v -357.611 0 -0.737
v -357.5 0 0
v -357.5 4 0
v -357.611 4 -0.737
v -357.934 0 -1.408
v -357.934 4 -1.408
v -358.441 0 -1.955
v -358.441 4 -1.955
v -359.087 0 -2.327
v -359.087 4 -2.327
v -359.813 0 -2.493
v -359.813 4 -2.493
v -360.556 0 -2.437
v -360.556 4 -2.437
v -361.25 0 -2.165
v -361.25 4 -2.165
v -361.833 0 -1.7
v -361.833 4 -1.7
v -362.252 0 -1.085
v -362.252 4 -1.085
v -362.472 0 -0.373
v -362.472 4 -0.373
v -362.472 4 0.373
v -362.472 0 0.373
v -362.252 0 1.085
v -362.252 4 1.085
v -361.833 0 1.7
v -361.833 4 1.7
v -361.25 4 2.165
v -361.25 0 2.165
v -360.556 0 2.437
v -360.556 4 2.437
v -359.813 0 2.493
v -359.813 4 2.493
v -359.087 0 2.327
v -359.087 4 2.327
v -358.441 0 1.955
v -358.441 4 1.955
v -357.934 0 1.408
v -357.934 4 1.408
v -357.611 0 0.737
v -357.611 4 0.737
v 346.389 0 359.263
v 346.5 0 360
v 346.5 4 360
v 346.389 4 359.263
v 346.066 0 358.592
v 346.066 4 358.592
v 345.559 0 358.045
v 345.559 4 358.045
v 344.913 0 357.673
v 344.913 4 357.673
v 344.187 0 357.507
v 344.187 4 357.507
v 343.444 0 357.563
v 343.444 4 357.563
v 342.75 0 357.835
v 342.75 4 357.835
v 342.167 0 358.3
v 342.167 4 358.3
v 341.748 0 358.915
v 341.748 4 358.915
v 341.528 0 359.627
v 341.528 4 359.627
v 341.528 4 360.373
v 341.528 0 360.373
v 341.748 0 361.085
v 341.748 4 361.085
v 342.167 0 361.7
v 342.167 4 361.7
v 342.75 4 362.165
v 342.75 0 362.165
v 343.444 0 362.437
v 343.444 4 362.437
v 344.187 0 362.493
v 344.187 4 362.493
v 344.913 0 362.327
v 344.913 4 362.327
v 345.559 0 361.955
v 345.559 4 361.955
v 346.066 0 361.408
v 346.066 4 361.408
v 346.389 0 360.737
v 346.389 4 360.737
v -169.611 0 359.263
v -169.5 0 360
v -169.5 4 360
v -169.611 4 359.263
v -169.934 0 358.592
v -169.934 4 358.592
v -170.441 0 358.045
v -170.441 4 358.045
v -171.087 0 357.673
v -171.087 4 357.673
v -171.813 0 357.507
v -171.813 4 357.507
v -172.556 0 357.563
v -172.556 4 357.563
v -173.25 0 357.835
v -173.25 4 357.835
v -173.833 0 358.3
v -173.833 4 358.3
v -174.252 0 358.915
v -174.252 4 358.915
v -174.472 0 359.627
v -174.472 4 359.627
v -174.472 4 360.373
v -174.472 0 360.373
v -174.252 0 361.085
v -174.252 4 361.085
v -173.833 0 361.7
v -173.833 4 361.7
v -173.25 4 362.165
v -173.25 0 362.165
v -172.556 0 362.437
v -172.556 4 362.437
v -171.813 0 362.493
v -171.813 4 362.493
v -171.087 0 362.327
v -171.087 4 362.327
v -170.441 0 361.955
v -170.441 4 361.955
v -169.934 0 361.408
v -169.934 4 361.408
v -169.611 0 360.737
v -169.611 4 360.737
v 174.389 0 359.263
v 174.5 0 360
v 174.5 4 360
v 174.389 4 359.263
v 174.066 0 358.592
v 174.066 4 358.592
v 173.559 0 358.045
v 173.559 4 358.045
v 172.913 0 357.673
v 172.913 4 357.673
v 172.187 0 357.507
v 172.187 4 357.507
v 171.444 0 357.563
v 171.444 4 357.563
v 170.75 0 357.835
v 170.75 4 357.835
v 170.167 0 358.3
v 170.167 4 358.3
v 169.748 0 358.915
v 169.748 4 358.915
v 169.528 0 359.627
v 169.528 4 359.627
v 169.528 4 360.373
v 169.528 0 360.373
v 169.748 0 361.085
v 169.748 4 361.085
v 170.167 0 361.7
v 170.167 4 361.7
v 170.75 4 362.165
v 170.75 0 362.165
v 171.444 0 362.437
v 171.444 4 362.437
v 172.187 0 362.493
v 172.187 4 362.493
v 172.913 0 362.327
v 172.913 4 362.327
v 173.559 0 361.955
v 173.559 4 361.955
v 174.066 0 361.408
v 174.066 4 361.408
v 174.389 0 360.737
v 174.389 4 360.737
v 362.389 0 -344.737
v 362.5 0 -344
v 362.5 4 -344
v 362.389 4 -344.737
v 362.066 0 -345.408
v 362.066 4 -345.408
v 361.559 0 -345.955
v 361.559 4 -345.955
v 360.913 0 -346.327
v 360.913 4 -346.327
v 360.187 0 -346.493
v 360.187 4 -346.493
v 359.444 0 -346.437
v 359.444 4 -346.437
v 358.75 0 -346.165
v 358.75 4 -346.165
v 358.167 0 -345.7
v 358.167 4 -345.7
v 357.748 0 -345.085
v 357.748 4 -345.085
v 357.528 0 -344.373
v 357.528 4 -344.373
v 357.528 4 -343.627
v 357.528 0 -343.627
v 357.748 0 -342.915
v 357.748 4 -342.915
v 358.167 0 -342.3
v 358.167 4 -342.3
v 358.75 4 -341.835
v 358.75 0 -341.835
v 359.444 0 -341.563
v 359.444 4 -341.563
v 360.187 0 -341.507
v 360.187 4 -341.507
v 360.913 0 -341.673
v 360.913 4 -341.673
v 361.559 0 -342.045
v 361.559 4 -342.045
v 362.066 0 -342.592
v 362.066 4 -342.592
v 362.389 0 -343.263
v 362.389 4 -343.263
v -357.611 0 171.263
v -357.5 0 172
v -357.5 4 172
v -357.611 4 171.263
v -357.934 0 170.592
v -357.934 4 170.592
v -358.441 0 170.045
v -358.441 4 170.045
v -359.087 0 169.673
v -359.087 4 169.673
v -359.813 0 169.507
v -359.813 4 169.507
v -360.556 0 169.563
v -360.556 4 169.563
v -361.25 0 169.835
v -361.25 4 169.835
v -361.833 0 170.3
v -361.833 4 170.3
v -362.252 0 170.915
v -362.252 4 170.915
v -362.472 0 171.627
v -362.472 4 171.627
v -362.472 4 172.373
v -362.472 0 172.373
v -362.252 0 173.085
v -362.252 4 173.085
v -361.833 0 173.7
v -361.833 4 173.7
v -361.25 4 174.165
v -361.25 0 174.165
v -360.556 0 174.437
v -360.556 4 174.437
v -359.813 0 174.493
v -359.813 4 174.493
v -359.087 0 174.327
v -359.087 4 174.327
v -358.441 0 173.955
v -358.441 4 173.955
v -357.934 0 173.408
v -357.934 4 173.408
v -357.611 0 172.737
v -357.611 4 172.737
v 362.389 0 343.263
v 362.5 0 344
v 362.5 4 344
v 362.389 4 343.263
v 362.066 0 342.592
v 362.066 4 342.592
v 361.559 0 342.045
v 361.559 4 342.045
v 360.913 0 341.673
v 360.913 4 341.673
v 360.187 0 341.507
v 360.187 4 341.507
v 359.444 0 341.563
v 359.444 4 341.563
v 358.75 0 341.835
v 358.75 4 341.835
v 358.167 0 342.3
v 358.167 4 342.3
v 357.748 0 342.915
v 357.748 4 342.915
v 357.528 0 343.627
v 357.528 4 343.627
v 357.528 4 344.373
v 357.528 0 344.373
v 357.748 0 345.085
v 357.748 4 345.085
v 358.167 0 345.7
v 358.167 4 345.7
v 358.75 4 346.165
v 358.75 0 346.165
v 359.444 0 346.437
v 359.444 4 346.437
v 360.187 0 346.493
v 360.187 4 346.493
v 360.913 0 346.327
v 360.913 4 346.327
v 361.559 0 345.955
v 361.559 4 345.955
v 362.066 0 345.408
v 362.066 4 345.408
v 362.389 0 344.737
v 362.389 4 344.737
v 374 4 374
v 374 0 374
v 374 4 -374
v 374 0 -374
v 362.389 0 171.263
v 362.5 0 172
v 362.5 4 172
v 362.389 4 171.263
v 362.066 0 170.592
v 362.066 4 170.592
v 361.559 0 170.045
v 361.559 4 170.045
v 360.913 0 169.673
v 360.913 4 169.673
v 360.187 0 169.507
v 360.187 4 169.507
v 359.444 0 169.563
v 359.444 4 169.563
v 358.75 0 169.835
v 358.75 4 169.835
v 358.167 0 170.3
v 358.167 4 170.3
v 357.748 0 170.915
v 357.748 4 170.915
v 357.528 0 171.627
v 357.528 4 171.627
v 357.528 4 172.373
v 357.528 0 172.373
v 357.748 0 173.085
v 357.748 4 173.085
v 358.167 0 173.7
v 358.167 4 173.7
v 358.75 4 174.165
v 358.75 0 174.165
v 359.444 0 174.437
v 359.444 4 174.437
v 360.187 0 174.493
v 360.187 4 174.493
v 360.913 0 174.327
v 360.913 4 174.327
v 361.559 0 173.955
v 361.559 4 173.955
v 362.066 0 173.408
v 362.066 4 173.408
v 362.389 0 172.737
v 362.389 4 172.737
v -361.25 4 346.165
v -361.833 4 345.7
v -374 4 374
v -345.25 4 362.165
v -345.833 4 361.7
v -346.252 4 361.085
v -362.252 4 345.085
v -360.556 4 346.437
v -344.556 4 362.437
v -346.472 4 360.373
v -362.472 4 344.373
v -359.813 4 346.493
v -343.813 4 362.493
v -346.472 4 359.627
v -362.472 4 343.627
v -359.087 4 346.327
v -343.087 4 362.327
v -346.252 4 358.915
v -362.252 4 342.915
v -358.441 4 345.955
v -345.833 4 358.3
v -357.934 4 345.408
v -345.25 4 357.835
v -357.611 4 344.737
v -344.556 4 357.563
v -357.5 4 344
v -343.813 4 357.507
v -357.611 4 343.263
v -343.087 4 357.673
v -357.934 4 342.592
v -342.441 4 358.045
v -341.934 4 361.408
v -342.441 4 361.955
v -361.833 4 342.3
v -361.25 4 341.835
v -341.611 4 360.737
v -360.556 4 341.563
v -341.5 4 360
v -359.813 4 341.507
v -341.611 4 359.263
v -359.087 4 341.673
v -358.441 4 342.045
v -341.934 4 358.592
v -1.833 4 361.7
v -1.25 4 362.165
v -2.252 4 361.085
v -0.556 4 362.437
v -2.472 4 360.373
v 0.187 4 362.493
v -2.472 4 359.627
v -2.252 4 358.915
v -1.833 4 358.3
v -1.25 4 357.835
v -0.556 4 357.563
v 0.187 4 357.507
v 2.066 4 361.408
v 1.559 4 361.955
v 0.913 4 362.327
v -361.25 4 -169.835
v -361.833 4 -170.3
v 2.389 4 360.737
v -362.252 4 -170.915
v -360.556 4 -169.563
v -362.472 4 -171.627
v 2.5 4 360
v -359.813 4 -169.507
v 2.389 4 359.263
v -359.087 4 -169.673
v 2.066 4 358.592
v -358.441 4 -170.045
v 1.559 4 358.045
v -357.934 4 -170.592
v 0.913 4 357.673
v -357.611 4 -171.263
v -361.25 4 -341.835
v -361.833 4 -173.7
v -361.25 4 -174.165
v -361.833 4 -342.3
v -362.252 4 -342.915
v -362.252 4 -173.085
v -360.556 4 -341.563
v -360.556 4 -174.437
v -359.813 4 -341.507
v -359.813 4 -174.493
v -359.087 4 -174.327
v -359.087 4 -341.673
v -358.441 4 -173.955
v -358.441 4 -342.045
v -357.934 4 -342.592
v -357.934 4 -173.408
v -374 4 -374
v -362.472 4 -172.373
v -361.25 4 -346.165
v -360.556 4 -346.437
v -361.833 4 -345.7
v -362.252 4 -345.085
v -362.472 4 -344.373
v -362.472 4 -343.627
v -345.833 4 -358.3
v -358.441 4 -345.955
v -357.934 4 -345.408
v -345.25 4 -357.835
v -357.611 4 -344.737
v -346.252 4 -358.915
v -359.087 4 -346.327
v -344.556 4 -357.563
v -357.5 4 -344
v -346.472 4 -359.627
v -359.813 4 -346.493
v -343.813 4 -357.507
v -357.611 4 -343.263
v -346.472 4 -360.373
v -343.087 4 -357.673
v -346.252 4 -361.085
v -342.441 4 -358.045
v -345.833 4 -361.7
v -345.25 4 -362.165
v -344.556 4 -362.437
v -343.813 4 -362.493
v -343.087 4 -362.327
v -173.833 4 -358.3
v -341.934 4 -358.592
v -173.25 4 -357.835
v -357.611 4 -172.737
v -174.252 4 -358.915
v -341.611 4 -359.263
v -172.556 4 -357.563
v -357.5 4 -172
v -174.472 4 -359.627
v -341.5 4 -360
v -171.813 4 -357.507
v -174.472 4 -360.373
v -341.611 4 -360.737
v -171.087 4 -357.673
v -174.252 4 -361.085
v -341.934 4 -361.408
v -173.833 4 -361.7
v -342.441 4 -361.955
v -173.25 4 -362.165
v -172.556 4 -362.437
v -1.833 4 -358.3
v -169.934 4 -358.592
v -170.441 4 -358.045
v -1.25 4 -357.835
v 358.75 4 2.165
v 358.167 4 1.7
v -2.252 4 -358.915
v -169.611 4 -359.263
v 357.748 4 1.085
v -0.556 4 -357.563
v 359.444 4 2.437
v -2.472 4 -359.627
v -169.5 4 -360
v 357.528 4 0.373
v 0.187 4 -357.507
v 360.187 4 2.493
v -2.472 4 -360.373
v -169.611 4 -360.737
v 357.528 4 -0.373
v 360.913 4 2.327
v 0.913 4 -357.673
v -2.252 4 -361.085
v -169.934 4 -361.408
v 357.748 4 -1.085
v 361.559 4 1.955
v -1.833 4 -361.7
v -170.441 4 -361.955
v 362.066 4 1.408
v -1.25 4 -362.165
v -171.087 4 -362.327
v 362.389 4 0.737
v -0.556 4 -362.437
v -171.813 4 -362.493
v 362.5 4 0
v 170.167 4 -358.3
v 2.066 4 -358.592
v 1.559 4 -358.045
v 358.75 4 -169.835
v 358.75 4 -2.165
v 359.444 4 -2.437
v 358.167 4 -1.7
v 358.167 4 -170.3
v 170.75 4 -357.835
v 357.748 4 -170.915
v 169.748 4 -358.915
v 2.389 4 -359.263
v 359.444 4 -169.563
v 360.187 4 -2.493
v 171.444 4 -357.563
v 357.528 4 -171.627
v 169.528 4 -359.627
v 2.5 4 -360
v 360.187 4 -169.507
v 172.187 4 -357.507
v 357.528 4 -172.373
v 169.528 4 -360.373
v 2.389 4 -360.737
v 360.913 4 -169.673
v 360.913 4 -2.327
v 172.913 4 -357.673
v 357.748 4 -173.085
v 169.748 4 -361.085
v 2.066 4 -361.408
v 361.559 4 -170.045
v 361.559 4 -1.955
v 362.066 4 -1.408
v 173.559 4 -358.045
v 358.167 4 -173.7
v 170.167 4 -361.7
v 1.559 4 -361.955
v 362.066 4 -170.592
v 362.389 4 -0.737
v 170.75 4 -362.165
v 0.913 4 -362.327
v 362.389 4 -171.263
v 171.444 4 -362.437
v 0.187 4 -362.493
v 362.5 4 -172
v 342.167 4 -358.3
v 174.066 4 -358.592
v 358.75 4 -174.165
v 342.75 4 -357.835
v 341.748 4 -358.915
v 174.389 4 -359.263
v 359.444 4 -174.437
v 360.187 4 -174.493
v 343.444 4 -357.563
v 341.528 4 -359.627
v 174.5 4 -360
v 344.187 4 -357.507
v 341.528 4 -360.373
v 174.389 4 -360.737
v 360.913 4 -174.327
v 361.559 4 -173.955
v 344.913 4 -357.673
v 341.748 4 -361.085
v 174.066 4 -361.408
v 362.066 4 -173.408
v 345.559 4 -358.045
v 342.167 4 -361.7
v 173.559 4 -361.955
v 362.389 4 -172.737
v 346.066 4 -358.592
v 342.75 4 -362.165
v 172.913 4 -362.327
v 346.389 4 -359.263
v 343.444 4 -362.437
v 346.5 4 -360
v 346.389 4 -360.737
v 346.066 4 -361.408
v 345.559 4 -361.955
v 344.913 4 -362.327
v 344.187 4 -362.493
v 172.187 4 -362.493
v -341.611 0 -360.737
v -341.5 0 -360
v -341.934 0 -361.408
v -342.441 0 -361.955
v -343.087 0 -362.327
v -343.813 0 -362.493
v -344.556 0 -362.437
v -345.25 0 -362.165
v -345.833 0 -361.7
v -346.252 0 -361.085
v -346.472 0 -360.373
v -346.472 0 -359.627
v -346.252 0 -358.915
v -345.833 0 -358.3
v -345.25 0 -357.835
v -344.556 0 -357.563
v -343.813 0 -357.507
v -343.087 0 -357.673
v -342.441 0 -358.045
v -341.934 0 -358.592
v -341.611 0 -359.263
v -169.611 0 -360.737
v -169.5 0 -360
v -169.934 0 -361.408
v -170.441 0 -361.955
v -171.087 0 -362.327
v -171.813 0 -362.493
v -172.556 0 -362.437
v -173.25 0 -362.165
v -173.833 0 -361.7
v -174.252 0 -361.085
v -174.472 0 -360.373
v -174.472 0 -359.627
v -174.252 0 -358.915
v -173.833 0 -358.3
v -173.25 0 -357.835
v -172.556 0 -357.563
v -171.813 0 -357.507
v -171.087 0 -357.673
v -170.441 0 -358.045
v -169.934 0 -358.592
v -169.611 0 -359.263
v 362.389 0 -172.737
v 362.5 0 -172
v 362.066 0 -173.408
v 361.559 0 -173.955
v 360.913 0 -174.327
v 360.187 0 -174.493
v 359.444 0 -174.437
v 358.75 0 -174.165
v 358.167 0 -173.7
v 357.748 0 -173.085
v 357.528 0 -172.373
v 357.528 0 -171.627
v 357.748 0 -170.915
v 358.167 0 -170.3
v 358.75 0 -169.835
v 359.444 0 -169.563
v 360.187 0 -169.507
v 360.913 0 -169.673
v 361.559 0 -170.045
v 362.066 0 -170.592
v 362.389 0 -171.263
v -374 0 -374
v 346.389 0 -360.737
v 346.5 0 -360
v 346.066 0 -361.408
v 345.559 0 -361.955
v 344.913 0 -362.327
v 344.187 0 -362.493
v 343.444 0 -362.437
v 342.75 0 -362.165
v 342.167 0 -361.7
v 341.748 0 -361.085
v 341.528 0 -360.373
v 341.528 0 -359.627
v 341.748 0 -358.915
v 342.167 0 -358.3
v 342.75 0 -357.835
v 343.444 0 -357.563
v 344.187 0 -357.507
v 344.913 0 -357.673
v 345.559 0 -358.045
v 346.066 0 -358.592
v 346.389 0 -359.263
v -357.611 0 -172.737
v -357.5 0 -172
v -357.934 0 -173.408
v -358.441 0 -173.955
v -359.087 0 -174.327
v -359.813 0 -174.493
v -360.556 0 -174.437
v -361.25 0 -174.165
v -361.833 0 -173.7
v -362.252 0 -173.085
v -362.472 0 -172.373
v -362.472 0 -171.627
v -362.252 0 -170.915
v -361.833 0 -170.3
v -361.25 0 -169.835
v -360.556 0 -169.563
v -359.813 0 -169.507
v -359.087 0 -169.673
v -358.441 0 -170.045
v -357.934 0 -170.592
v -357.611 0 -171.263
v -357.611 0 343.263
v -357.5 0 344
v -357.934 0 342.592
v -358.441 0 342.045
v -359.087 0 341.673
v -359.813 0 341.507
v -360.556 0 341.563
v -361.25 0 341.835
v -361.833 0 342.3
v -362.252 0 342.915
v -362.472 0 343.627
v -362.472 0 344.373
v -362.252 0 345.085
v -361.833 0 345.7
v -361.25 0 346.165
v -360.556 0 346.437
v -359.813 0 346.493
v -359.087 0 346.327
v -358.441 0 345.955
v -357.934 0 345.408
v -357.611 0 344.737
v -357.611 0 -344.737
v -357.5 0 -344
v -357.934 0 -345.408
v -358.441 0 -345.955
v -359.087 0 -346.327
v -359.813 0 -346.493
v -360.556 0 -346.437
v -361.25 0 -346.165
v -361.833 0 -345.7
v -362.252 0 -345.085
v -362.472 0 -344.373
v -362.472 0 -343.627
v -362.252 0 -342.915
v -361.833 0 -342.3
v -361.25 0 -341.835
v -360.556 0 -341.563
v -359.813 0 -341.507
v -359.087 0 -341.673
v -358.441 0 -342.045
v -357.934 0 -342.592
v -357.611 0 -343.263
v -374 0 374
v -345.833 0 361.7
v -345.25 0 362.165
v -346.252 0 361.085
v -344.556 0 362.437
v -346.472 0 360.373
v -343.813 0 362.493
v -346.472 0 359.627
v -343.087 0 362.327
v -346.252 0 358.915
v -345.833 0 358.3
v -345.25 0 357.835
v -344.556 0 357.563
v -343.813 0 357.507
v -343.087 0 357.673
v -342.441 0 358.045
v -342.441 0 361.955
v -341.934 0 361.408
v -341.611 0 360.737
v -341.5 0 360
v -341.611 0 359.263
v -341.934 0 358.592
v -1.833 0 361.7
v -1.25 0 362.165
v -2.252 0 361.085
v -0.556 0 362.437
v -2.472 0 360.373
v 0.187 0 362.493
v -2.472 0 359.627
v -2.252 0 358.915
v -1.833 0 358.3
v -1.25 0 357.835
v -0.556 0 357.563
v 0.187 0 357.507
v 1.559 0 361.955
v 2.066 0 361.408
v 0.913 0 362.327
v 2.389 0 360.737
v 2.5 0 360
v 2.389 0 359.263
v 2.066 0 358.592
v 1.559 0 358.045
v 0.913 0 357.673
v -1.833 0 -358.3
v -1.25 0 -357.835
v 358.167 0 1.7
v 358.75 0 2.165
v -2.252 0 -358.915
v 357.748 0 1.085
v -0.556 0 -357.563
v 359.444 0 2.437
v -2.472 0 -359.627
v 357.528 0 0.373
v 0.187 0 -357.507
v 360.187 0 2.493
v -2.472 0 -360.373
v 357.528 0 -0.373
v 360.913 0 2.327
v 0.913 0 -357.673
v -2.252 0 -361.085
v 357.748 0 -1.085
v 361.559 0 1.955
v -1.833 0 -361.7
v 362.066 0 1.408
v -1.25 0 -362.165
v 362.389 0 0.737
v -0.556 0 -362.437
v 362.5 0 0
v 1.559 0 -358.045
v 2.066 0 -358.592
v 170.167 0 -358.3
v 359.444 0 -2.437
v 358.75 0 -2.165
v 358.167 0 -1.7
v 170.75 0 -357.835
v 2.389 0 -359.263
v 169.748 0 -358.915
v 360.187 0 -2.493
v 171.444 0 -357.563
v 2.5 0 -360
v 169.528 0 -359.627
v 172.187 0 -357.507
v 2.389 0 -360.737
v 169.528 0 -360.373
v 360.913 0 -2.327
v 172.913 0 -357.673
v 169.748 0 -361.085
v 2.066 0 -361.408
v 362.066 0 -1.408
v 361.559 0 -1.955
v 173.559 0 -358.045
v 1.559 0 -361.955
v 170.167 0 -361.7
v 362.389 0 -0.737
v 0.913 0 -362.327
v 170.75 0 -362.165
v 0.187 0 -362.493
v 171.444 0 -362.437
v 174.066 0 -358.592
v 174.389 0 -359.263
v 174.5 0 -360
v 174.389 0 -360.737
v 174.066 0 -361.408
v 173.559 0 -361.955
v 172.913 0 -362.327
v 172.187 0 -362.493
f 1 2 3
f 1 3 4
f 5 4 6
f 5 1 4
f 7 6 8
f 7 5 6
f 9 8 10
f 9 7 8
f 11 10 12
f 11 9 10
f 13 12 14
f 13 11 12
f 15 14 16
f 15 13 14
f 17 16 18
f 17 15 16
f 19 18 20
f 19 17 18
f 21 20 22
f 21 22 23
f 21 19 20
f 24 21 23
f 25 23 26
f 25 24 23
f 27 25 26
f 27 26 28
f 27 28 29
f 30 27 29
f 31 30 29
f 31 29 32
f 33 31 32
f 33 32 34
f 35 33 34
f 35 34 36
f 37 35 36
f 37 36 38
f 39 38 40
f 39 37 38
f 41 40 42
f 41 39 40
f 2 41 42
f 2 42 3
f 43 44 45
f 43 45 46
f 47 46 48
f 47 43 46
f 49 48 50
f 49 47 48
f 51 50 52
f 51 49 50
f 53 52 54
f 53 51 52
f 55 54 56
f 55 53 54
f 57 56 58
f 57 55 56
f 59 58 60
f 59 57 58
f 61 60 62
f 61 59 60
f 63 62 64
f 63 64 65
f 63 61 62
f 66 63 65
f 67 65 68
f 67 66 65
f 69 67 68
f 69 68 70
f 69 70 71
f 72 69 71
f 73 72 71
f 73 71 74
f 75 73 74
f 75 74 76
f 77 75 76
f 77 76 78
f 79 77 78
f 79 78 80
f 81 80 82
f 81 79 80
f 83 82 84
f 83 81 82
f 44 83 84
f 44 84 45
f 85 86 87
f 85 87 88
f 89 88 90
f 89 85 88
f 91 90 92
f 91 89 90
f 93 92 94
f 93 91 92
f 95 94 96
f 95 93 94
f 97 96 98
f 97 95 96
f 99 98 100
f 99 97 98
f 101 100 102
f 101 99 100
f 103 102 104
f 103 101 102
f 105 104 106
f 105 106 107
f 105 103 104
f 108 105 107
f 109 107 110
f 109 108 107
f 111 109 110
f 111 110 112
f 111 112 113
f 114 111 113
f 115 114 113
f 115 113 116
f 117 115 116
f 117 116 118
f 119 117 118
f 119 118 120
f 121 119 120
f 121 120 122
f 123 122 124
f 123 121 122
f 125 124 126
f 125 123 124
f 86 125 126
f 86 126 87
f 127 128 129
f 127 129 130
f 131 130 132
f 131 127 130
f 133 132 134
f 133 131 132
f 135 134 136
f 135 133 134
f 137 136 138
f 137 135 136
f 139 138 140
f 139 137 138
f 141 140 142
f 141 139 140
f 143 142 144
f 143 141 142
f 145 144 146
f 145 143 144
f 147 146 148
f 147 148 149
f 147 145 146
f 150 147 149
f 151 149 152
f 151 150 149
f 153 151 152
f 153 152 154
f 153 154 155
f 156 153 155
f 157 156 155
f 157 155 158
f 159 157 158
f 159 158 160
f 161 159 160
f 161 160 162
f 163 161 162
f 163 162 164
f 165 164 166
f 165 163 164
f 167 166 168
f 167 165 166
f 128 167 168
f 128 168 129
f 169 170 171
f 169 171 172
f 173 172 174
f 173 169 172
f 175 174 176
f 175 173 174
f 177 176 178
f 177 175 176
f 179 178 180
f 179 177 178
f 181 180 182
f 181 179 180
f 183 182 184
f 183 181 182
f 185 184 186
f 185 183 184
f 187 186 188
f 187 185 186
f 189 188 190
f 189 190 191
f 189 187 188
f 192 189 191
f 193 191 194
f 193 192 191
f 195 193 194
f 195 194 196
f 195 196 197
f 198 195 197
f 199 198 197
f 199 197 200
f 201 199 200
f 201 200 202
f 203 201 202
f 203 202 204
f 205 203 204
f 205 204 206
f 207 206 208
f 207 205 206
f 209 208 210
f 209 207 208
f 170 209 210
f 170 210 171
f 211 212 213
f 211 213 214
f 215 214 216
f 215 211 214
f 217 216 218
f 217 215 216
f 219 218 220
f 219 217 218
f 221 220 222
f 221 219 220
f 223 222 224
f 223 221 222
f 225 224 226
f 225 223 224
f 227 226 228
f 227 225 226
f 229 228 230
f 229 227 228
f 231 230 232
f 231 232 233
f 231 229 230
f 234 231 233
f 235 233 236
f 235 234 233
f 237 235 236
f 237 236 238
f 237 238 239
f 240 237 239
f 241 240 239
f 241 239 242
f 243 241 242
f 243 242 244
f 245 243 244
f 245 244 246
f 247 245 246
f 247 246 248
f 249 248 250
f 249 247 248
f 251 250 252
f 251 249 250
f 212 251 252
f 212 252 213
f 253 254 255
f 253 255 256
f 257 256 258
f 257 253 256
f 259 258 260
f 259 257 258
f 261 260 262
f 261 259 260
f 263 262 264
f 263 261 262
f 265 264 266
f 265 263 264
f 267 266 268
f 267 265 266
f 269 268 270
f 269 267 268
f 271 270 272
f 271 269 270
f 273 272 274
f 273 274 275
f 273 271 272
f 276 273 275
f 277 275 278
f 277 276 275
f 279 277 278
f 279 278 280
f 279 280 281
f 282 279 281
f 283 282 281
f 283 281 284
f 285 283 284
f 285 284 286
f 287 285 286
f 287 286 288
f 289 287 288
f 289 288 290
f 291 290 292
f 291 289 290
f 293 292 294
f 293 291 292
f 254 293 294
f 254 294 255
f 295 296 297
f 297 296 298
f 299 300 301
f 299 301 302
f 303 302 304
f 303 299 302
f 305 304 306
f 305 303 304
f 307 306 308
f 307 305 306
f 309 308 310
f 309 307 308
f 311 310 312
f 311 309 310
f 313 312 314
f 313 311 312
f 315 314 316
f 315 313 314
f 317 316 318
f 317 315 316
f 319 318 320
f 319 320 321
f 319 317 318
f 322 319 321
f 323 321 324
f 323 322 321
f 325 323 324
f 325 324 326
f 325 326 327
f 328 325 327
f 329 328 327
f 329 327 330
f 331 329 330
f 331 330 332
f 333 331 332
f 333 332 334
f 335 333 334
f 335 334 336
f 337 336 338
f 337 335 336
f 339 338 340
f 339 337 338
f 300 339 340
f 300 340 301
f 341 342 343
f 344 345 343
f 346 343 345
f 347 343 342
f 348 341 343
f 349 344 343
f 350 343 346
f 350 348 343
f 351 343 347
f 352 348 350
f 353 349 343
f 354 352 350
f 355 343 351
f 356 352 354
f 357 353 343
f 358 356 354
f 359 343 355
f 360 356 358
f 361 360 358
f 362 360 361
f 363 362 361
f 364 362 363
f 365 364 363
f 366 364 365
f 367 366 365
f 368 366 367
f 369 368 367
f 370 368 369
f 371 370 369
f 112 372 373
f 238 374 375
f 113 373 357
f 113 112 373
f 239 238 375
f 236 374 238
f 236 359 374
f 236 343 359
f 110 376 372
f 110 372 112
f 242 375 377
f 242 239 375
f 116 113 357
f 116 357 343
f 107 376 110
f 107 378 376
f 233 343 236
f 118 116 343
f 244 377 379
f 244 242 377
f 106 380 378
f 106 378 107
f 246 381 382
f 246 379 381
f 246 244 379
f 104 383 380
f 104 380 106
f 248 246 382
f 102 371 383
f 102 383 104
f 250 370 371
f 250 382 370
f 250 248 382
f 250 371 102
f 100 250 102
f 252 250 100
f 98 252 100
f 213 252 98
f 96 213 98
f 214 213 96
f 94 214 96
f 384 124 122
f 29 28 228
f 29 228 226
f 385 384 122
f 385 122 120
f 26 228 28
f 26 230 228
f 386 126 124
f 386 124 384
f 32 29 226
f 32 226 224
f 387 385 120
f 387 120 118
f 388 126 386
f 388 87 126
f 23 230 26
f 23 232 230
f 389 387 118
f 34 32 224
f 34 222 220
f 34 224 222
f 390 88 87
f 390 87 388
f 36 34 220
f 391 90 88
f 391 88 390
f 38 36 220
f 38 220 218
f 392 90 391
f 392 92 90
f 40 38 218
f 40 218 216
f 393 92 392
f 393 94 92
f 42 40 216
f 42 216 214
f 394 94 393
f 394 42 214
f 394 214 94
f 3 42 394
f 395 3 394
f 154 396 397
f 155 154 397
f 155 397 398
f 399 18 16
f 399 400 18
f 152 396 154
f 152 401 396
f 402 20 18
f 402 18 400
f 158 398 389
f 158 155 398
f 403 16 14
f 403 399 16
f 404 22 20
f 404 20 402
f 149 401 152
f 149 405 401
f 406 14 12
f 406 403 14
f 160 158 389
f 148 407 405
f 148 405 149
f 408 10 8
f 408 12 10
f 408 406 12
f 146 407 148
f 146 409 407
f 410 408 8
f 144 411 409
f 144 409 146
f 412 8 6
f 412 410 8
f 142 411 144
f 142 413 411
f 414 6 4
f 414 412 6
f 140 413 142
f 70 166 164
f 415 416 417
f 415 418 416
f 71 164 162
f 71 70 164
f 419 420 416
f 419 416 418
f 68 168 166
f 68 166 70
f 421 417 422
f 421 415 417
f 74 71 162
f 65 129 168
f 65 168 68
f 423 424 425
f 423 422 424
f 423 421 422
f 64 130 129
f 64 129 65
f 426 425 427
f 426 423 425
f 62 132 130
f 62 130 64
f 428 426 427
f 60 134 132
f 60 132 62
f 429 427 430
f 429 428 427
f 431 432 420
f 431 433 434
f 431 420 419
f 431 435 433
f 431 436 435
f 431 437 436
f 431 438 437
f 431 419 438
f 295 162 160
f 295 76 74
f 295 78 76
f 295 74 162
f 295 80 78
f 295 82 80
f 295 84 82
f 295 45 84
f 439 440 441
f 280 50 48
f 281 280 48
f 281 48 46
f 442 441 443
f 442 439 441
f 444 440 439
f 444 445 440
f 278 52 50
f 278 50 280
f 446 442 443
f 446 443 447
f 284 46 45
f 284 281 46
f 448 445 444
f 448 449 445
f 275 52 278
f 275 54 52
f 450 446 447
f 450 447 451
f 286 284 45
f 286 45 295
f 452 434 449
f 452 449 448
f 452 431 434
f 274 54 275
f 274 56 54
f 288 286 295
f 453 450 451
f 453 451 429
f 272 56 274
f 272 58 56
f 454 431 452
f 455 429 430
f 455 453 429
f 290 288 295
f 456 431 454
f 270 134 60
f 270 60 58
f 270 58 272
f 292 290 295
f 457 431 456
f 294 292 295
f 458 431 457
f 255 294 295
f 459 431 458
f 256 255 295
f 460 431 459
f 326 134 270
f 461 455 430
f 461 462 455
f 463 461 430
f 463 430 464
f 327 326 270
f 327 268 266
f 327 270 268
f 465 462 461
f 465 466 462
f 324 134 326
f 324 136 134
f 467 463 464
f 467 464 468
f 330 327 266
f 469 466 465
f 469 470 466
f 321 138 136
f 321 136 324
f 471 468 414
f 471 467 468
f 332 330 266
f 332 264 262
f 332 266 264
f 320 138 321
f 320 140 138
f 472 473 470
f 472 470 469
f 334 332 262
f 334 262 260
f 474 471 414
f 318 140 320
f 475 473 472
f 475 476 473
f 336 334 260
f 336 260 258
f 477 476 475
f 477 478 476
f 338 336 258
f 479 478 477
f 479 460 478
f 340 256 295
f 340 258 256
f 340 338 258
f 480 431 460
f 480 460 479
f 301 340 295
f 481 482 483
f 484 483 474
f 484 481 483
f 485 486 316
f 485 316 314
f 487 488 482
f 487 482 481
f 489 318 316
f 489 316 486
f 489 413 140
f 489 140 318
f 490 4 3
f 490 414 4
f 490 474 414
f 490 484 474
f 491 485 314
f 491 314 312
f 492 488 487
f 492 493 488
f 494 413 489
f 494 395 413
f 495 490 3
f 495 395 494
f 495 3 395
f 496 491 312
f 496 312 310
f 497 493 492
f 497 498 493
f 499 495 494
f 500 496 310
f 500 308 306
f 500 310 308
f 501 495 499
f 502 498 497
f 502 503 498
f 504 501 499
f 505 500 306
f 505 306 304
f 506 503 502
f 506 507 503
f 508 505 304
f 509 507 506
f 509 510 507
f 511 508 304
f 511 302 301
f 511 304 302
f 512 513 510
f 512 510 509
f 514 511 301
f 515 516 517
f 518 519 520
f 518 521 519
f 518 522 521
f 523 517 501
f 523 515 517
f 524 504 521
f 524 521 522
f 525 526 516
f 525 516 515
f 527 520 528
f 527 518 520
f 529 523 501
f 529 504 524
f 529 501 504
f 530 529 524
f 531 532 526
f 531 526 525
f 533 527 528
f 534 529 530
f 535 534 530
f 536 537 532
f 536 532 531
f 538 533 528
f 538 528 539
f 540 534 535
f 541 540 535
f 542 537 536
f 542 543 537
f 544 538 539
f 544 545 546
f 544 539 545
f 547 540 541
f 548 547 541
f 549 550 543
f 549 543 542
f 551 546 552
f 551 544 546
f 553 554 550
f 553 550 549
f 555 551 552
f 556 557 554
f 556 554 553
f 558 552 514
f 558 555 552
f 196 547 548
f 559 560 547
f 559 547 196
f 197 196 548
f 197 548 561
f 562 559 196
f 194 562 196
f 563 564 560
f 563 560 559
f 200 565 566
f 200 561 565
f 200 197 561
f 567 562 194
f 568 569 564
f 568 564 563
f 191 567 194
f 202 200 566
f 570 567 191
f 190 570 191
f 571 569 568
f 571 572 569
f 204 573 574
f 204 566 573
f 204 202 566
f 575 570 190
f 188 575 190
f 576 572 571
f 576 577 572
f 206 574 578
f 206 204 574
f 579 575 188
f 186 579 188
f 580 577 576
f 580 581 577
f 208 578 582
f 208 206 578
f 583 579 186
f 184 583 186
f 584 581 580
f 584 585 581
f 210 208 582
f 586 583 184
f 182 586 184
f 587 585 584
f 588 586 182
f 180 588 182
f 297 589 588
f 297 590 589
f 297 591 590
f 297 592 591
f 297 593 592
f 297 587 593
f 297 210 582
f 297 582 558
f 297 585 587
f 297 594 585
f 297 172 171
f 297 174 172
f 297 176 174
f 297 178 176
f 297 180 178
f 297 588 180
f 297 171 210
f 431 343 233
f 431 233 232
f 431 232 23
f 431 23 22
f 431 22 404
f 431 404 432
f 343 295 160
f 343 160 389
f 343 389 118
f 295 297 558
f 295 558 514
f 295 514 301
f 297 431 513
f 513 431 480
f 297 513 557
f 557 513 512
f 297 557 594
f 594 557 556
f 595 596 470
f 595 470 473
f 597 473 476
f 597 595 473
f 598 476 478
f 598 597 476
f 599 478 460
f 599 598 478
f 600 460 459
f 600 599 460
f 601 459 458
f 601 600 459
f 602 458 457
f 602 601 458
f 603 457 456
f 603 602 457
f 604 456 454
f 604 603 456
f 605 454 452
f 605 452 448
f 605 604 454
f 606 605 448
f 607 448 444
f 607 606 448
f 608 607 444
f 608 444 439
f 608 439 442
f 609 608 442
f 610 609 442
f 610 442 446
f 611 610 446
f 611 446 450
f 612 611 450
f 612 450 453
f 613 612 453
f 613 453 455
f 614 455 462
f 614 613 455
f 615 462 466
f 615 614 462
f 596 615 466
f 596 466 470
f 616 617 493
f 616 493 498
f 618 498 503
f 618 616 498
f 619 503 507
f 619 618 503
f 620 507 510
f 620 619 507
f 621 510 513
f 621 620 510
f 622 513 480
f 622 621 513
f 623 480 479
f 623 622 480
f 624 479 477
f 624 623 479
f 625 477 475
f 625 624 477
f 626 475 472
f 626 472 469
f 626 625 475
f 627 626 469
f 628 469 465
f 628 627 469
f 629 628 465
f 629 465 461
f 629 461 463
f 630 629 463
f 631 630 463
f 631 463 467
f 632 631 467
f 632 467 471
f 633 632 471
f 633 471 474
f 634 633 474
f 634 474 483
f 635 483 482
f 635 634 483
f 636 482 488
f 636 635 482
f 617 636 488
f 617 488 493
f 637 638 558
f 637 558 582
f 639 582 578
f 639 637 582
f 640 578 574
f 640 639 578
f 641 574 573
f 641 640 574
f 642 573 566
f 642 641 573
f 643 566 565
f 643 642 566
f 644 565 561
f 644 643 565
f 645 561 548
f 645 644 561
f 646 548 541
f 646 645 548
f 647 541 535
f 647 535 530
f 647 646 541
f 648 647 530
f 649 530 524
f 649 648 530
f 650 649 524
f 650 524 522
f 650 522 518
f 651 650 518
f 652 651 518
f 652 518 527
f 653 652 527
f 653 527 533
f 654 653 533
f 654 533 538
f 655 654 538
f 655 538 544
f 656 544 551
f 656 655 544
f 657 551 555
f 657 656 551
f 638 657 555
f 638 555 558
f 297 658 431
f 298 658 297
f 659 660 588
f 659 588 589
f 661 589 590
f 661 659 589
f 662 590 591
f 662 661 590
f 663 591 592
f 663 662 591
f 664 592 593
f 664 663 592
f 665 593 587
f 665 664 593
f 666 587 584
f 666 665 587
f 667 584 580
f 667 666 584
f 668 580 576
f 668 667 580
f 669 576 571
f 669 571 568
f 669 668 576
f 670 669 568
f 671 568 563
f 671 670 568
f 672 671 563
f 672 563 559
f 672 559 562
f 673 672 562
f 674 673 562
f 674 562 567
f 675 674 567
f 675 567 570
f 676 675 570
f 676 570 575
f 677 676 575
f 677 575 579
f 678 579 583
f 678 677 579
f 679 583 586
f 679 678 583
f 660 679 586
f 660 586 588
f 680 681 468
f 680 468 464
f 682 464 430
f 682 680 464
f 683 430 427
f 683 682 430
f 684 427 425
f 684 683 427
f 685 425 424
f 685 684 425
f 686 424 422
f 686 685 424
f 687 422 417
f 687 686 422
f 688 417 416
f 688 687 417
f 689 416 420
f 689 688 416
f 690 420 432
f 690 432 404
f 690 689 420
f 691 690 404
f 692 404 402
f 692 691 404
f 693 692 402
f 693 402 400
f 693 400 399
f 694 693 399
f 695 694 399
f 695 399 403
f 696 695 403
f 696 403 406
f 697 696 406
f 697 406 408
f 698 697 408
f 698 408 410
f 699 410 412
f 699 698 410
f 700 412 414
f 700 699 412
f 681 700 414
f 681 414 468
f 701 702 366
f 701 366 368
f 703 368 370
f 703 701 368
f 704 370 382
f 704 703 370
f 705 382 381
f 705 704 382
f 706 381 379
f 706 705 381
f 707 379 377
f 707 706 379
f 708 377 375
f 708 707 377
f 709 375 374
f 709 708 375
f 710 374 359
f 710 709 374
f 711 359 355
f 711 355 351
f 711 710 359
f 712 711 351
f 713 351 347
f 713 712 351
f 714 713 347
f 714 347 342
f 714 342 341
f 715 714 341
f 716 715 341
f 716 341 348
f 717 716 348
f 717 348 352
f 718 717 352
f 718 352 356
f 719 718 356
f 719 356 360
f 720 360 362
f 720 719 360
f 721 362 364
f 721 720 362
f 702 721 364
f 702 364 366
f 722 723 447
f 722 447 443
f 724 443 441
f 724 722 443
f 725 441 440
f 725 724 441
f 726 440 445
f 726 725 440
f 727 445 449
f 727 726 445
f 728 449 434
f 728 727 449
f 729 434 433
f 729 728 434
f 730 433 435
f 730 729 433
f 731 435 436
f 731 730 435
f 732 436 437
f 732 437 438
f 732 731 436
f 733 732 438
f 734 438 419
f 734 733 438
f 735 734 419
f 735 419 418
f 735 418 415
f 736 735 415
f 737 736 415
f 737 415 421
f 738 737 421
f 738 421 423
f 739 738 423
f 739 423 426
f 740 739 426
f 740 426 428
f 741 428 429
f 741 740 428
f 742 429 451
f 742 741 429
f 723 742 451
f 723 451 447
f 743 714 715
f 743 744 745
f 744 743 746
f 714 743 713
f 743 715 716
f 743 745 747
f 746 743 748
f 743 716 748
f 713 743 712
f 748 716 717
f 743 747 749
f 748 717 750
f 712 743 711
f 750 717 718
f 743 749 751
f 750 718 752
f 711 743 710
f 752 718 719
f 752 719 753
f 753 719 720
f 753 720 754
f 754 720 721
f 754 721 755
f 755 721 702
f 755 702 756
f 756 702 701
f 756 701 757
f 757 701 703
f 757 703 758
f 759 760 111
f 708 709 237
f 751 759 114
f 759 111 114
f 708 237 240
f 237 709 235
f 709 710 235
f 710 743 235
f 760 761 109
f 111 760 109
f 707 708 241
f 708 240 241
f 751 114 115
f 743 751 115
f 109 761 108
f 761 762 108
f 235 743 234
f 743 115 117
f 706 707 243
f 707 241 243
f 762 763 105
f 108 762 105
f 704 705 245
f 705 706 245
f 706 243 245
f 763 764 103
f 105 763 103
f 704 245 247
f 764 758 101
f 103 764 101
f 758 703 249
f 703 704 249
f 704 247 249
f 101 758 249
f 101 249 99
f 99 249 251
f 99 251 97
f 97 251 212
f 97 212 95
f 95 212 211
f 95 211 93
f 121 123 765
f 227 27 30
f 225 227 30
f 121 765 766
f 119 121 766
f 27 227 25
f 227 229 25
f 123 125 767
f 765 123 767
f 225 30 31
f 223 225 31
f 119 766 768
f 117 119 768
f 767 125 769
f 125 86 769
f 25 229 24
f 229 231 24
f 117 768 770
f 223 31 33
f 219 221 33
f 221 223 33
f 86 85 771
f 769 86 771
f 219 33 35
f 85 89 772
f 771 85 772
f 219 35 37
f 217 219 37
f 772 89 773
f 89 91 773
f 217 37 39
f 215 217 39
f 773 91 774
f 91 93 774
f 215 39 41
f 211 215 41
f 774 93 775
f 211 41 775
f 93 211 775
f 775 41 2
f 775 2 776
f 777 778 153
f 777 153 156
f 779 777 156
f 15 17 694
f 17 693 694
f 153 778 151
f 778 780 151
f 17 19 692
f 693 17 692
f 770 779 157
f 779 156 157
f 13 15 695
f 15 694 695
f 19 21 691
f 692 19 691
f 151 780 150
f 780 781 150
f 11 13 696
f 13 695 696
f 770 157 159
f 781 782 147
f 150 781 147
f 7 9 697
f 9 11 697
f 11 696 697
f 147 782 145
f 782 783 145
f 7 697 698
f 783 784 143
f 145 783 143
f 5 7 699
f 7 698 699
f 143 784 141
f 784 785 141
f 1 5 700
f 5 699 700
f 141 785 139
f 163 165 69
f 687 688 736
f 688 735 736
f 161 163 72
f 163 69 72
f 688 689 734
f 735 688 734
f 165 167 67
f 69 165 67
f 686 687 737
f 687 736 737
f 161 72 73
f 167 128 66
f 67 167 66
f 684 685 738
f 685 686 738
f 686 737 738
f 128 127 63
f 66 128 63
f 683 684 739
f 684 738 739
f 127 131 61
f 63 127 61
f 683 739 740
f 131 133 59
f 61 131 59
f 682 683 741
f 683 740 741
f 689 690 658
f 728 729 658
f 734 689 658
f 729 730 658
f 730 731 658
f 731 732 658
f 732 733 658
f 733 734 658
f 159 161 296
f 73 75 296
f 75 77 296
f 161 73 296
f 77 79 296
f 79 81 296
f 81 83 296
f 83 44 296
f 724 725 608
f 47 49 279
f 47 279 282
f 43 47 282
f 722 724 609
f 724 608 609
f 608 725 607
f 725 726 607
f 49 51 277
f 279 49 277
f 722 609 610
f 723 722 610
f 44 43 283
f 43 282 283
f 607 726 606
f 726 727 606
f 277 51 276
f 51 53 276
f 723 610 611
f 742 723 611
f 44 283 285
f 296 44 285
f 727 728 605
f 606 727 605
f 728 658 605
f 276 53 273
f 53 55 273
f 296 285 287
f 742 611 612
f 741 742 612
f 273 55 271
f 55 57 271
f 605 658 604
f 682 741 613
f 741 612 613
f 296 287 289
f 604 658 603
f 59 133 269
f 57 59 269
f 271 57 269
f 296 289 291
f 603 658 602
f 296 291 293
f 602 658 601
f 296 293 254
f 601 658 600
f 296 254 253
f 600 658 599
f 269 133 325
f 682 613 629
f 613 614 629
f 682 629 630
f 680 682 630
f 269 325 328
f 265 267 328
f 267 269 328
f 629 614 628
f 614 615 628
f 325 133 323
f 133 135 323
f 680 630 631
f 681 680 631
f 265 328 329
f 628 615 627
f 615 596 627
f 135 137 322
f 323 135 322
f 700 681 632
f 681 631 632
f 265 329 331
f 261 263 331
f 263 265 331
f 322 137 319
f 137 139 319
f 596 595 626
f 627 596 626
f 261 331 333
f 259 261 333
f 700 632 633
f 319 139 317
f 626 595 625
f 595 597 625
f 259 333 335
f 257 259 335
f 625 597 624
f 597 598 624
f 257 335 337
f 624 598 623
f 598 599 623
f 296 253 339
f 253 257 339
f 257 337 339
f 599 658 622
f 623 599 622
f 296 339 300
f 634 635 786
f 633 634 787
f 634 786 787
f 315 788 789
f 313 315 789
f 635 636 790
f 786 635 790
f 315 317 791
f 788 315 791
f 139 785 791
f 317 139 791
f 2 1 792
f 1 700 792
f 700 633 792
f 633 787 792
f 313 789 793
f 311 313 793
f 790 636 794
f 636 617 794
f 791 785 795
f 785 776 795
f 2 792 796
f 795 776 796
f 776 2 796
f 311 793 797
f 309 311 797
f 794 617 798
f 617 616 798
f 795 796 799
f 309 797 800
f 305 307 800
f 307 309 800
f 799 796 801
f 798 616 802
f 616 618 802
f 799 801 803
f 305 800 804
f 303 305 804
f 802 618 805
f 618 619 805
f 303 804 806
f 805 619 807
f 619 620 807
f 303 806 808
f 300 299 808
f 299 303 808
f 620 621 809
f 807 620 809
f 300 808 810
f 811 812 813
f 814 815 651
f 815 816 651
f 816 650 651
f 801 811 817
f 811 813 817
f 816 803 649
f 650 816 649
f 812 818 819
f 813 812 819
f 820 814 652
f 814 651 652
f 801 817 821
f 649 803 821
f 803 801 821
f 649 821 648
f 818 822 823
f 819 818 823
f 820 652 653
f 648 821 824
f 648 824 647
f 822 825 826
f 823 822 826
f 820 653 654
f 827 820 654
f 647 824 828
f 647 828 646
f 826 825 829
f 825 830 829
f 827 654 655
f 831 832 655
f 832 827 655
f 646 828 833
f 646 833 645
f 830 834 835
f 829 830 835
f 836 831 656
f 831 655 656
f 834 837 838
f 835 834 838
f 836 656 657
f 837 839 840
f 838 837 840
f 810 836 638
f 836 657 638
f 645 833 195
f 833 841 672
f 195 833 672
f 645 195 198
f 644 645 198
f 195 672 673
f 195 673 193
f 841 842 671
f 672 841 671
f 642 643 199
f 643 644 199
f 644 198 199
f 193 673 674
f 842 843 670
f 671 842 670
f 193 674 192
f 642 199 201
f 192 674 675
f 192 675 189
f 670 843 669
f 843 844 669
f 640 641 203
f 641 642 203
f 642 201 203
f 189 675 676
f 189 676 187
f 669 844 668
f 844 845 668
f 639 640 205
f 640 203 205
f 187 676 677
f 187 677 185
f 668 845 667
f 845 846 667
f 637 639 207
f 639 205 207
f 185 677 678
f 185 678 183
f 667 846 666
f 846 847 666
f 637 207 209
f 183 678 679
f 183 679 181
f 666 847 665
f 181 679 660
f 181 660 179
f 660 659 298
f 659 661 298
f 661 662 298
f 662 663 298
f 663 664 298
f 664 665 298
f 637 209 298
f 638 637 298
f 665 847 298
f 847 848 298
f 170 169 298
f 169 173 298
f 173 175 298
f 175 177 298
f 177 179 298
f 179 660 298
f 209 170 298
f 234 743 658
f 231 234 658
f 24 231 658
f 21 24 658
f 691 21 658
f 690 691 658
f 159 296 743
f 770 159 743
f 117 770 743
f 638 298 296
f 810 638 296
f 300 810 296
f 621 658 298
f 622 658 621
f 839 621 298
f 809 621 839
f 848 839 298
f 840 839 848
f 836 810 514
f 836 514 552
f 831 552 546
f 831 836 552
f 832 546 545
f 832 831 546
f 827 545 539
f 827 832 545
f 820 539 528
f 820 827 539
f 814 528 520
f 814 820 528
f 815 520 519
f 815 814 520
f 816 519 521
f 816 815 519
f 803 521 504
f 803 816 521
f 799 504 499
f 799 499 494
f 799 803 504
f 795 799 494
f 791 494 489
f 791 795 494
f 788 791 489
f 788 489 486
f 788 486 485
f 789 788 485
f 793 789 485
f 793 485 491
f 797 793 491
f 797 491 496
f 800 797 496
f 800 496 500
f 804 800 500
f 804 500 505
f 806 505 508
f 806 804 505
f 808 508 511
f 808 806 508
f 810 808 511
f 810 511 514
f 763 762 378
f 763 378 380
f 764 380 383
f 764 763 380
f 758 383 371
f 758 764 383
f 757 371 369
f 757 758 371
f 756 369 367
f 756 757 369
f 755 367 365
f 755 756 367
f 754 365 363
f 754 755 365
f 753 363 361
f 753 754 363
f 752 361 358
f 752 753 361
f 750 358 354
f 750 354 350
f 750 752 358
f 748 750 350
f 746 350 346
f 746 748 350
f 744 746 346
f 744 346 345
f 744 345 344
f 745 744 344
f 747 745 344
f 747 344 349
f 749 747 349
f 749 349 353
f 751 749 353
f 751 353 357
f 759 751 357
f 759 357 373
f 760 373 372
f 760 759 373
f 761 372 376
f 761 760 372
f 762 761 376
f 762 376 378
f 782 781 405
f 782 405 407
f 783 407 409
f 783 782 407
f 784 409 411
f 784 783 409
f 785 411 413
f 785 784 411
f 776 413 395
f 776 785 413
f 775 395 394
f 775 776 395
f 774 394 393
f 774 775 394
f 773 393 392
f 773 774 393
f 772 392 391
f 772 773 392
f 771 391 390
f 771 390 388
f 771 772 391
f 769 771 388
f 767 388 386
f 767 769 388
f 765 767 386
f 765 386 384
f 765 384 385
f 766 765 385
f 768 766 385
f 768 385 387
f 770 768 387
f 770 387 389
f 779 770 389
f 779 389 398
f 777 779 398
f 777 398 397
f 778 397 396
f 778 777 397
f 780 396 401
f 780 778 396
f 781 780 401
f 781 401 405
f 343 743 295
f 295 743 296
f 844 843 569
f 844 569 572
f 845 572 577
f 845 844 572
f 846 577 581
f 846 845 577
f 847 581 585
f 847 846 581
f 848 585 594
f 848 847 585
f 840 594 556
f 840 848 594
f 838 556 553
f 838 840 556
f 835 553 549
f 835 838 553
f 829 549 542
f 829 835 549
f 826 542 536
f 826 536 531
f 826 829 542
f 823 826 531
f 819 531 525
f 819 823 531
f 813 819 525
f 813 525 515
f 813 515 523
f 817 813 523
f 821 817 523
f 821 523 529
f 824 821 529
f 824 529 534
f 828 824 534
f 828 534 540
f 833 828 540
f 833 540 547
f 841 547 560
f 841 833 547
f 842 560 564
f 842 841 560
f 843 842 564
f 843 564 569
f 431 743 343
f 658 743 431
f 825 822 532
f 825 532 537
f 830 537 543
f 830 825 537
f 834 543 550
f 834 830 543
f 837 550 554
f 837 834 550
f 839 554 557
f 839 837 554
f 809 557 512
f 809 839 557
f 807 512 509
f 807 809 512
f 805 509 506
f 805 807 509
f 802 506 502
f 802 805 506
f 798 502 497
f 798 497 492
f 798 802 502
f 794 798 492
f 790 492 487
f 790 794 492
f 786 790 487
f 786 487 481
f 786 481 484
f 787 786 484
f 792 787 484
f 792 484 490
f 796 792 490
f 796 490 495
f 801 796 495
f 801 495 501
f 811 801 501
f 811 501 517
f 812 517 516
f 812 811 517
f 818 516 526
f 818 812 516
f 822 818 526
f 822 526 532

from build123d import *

# Parameters (mm, degrees)
SKETCH1_W           = 748
SKETCH1_H           = 748
SKETCH1_R           = 2.5
BOSS_EXTRUDE1_DEPTH = 4


with BuildPart() as part:
    # Sketch1 → Boss-Extrude1 (new body)
    with BuildSketch(Plane(origin=(0, 0, 0), x_dir=(1, 0, 0), z_dir=(0, 1, 0))):
        Rectangle(SKETCH1_W, SKETCH1_H)
        with Locations((-344, 360)):
            Circle(SKETCH1_R, mode=Mode.SUBTRACT)
        with Locations((0, 360)):
            Circle(SKETCH1_R, mode=Mode.SUBTRACT)
        with Locations((-172, 360)):
            Circle(SKETCH1_R, mode=Mode.SUBTRACT)
        with Locations((-360, 0)):
            Circle(SKETCH1_R, mode=Mode.SUBTRACT)
        with Locations((-360, 172)):
            Circle(SKETCH1_R, mode=Mode.SUBTRACT)
        with Locations((-360, 344)):
            Circle(SKETCH1_R, mode=Mode.SUBTRACT)
        with Locations((360, 0)):
            Circle(SKETCH1_R, mode=Mode.SUBTRACT)
        with Locations((172, 360)):
            Circle(SKETCH1_R, mode=Mode.SUBTRACT)
        with Locations((360, 344)):
            Circle(SKETCH1_R, mode=Mode.SUBTRACT)
        with Locations((360, 172)):
            Circle(SKETCH1_R, mode=Mode.SUBTRACT)
        with Locations((344, 360)):
            Circle(SKETCH1_R, mode=Mode.SUBTRACT)
        with Locations((360, -172)):
            Circle(SKETCH1_R, mode=Mode.SUBTRACT)
        with Locations((360, -344)):
            Circle(SKETCH1_R, mode=Mode.SUBTRACT)
        with Locations((344, -360)):
            Circle(SKETCH1_R, mode=Mode.SUBTRACT)
        with Locations((172, -360)):
            Circle(SKETCH1_R, mode=Mode.SUBTRACT)
        with Locations((0, -360)):
            Circle(SKETCH1_R, mode=Mode.SUBTRACT)
        with Locations((-172, -360)):
            Circle(SKETCH1_R, mode=Mode.SUBTRACT)
        with Locations((-344, -360)):
            Circle(SKETCH1_R, mode=Mode.SUBTRACT)
        with Locations((-360, -344)):
            Circle(SKETCH1_R, mode=Mode.SUBTRACT)
        with Locations((-360, -172)):
            Circle(SKETCH1_R, mode=Mode.SUBTRACT)
    extrude(amount=BOSS_EXTRUDE1_DEPTH)


solid = part.part
